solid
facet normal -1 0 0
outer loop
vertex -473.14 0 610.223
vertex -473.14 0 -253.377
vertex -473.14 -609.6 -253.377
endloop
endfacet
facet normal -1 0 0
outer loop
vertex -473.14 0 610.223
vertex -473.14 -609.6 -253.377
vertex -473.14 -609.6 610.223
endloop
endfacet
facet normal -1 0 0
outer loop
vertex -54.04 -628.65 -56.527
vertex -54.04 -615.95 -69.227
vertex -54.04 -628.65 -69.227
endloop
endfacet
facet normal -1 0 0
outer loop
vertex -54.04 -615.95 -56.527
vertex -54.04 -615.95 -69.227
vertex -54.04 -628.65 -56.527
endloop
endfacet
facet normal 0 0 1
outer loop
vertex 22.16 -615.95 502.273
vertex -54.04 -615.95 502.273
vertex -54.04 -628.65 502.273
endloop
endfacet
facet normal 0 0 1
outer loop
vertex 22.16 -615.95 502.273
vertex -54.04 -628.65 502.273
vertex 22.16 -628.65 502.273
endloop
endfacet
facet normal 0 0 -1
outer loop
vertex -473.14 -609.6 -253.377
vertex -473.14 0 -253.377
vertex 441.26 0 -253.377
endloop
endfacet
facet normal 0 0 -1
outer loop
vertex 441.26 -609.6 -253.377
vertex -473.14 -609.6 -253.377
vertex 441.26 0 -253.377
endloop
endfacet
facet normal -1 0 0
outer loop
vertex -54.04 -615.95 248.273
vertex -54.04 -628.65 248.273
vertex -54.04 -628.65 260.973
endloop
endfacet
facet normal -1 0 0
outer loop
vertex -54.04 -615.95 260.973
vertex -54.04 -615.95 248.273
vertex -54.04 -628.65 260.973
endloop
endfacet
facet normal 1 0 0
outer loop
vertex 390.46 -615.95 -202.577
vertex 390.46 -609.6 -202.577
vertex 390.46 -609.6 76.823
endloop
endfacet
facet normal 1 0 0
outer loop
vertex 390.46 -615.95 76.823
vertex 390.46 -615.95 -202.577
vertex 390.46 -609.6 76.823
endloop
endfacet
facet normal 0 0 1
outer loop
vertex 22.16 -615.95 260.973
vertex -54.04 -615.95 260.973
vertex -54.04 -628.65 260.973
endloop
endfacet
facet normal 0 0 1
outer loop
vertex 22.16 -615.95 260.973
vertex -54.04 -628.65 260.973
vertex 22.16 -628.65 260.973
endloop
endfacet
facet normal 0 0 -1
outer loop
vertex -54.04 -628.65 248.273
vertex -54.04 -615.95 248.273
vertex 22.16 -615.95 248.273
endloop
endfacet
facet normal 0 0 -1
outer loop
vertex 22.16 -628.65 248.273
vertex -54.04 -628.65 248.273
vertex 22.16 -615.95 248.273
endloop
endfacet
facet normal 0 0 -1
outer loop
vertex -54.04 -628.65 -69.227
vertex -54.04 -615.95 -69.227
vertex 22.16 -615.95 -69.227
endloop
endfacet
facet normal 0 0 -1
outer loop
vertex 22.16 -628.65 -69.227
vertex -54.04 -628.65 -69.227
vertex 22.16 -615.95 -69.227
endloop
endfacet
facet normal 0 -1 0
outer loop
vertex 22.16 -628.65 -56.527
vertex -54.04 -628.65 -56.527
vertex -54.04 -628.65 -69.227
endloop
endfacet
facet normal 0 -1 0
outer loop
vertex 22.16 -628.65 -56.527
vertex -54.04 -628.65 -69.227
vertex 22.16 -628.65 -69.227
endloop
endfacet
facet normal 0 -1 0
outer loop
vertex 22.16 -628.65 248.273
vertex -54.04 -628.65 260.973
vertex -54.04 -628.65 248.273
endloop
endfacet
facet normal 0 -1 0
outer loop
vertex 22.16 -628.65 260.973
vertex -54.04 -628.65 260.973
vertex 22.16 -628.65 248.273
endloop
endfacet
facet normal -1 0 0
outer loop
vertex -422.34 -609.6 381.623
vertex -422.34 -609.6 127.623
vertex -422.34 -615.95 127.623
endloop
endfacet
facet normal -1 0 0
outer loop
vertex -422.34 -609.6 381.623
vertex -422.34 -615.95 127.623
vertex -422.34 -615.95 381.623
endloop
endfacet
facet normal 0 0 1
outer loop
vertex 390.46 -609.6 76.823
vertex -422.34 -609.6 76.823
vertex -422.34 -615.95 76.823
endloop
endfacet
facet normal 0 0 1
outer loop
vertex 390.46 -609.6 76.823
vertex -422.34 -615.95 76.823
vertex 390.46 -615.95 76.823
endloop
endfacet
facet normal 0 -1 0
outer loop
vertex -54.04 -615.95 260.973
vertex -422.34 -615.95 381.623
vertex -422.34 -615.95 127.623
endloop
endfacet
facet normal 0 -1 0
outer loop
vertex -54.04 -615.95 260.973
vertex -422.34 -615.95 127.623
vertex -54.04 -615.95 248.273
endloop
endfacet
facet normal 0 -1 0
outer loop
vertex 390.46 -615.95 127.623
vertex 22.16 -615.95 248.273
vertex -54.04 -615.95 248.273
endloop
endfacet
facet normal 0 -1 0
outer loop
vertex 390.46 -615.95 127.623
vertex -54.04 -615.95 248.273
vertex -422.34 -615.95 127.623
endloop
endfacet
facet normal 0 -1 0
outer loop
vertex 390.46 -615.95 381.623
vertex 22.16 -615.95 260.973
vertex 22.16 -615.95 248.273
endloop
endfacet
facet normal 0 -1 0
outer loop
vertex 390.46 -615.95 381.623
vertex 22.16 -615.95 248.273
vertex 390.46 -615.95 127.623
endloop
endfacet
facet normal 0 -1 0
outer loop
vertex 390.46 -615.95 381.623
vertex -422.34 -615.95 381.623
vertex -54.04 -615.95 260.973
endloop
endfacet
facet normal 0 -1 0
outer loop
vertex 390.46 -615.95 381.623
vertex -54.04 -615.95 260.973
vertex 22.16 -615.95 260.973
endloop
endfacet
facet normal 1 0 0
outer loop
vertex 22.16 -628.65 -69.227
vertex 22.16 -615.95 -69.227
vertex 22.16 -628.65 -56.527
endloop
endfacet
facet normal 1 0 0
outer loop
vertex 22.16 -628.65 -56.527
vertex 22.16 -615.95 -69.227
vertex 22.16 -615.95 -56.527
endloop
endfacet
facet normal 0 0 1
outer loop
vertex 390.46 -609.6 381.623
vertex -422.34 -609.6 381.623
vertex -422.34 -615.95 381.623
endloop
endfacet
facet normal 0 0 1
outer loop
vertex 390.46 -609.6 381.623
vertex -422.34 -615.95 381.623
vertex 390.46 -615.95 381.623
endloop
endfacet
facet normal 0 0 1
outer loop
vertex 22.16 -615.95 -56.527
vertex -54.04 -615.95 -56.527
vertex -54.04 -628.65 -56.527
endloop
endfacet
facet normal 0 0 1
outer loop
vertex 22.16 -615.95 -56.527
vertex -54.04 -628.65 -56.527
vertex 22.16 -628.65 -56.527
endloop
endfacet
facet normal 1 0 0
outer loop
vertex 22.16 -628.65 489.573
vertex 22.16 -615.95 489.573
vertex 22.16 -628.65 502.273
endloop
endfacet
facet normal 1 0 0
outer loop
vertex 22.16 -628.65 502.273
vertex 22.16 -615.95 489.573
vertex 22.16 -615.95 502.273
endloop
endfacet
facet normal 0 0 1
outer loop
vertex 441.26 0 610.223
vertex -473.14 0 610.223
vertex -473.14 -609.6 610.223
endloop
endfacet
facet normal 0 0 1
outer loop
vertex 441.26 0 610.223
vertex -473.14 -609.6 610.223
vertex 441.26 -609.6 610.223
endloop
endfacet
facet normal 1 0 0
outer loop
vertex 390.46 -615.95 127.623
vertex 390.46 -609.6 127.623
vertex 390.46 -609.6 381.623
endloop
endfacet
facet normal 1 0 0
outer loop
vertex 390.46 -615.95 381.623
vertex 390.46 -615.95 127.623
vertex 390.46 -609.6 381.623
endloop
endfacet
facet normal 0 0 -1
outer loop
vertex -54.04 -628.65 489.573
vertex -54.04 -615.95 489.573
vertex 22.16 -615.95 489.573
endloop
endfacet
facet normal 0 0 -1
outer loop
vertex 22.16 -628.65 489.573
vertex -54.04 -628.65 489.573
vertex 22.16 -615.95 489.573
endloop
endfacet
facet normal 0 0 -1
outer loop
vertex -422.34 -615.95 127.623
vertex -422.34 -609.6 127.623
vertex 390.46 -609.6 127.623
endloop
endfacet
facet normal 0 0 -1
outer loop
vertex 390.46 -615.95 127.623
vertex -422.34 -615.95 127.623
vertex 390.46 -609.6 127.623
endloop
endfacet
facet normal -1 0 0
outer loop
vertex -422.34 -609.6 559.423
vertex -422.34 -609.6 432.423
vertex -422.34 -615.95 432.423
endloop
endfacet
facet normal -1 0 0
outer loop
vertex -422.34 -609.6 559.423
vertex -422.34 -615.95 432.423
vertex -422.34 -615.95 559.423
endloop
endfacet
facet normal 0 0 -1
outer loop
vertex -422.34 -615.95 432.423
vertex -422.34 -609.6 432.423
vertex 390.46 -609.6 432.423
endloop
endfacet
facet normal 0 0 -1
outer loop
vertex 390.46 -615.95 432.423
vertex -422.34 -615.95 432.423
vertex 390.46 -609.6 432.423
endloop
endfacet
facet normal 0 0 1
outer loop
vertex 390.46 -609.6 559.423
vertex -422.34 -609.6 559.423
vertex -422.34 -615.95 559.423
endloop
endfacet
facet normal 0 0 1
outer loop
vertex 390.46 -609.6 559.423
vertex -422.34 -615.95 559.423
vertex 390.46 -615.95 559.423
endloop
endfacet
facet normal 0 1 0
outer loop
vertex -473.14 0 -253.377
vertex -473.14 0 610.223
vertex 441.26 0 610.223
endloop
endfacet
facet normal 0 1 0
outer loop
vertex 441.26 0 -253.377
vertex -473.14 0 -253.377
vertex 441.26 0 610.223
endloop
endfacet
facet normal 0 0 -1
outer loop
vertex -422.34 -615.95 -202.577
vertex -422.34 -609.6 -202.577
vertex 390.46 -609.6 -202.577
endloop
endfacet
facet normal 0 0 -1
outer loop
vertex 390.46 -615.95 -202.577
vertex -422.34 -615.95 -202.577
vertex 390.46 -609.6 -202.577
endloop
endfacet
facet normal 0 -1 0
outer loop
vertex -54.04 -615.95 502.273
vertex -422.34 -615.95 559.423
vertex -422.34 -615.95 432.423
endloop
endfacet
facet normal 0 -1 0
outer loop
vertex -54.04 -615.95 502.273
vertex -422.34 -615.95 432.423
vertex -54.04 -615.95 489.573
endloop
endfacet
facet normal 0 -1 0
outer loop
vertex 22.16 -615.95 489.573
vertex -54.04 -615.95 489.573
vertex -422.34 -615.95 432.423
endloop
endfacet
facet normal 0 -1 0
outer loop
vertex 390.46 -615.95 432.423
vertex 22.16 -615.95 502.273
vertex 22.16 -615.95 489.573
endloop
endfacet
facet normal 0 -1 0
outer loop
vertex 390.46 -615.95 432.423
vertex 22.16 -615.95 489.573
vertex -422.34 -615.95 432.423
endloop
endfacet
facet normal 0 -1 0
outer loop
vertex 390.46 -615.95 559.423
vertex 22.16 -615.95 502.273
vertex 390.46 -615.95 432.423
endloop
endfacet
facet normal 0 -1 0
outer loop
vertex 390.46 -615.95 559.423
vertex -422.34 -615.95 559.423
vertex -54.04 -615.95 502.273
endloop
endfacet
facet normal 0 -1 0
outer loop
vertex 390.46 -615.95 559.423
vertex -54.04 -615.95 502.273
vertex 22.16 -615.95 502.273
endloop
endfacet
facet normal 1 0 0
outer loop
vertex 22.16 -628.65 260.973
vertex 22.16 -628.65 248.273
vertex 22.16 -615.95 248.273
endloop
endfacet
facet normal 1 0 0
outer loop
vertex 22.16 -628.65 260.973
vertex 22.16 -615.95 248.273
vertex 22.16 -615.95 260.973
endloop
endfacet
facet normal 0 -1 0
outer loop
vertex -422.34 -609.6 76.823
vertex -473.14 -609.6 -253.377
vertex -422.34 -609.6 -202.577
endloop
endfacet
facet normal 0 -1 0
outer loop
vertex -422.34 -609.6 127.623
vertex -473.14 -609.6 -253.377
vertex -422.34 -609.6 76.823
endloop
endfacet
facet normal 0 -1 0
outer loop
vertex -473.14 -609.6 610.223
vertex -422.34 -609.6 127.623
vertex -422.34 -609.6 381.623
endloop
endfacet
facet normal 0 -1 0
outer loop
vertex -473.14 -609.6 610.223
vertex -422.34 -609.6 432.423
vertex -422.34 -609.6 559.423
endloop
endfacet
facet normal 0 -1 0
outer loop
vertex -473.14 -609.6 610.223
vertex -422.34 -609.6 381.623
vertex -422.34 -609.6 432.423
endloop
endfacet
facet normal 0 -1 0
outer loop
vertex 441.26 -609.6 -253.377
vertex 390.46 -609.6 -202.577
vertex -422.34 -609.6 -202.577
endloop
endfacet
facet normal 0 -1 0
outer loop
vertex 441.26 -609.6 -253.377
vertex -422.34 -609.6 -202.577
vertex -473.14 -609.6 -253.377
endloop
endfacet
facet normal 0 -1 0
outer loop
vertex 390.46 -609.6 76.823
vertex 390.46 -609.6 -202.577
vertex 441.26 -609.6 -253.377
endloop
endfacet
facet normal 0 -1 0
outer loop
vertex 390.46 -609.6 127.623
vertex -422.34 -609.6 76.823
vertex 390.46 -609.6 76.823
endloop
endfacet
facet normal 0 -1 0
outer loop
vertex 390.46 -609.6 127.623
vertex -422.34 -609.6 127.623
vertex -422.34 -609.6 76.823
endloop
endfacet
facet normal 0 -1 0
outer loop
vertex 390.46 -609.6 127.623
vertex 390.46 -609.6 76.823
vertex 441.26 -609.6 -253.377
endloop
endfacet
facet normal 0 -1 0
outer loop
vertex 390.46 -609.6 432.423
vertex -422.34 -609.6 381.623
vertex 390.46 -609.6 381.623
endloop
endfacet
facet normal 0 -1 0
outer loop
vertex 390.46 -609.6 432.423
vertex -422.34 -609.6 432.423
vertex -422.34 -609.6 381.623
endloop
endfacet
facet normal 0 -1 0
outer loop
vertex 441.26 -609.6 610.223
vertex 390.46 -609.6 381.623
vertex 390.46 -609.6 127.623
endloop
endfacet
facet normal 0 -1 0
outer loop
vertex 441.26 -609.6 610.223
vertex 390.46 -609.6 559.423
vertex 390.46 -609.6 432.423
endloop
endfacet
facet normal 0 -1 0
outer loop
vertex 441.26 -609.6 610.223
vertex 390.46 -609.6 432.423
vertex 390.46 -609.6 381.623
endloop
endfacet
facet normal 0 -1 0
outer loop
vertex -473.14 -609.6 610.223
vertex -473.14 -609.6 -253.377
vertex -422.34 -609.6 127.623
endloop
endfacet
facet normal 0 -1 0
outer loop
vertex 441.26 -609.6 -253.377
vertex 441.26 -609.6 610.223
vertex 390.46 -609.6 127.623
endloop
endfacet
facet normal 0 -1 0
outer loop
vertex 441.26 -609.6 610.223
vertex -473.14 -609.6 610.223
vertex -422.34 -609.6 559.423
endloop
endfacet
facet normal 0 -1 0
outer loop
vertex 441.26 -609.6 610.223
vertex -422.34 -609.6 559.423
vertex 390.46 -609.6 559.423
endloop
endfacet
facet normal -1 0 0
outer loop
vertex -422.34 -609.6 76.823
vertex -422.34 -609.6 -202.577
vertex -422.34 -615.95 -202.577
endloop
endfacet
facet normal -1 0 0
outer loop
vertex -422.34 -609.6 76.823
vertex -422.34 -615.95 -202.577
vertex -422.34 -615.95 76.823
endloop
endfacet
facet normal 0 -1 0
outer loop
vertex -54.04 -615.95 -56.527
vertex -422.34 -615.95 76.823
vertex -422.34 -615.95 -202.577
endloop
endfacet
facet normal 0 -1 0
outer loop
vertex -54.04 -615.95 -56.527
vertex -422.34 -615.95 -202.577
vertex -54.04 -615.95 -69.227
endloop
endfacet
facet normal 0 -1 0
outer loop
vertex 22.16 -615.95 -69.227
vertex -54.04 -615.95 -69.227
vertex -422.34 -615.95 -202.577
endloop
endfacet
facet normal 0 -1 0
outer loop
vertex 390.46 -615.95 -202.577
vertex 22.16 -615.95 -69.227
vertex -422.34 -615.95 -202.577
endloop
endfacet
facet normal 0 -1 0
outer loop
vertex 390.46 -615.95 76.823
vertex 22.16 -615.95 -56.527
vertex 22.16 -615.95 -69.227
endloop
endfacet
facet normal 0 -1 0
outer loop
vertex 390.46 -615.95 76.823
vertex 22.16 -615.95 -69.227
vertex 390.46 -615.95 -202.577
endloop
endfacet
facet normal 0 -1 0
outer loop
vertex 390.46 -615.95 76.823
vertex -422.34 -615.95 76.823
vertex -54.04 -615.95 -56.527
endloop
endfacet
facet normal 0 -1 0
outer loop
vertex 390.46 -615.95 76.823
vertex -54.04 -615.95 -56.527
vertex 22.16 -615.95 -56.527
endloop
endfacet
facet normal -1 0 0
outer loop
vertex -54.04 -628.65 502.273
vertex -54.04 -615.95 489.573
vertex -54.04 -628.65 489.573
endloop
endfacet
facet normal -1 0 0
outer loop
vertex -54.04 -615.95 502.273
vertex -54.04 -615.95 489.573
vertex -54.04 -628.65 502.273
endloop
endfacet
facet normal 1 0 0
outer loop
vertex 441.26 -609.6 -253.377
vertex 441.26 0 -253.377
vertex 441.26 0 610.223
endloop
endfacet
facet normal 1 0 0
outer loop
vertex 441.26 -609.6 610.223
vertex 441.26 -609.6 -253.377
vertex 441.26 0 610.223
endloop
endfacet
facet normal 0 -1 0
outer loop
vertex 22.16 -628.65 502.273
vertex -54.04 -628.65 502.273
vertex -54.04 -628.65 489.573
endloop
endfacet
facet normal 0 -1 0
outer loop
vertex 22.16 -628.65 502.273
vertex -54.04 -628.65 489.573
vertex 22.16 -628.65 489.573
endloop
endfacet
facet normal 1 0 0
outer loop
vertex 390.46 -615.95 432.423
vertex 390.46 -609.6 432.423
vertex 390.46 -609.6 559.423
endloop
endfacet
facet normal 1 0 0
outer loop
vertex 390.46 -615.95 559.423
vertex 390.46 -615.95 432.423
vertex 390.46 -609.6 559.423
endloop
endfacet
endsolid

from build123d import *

# Parameters (mm, degrees)
F0_W     = 914.4
F0_H     = 863.6
F1_DEPTH = 609.6
F2_W     = 812.8
F2_H     = 127
F2_H_2   = 254
F2_H_3   = 279.4
F3_DEPTH = 6.35
F4_W     = 76.2
F4_H     = 12.7
F5_DEPTH = 12.7


with BuildPart() as f1:
    # F0 (on Front) → F1 (new body)
    with BuildSketch(Plane.XZ):
        with Locations((-15.939765, 178.42269)):
            Rectangle(F0_W, F0_H)
    extrude(amount=F1_DEPTH)

    # F2 (on face) → F3 (join)
    with BuildSketch(Plane.XZ.offset(609.6)):
        with Locations((-15.939765, 495.92269)):
            Rectangle(F2_W, F2_H)
        with Locations((-15.939765, 254.62269)):
            Rectangle(F2_W, F2_H_2)
        with Locations((-15.939765, -62.87731)):
            Rectangle(F2_W, F2_H_3)
    extrude(amount=F3_DEPTH)

    # F4 (on face) → F5 (join)
    with BuildSketch(Plane.XZ.offset(615.95)):
        with Locations((-15.939765, 495.92269)):
            Rectangle(F4_W, F4_H)
        with Locations((-15.939765, 254.62269)):
            Rectangle(F4_W, F4_H)
        with Locations((-15.939765, -62.87731)):
            Rectangle(F4_W, F4_H)
    extrude(amount=F5_DEPTH)


solid = f1.part
